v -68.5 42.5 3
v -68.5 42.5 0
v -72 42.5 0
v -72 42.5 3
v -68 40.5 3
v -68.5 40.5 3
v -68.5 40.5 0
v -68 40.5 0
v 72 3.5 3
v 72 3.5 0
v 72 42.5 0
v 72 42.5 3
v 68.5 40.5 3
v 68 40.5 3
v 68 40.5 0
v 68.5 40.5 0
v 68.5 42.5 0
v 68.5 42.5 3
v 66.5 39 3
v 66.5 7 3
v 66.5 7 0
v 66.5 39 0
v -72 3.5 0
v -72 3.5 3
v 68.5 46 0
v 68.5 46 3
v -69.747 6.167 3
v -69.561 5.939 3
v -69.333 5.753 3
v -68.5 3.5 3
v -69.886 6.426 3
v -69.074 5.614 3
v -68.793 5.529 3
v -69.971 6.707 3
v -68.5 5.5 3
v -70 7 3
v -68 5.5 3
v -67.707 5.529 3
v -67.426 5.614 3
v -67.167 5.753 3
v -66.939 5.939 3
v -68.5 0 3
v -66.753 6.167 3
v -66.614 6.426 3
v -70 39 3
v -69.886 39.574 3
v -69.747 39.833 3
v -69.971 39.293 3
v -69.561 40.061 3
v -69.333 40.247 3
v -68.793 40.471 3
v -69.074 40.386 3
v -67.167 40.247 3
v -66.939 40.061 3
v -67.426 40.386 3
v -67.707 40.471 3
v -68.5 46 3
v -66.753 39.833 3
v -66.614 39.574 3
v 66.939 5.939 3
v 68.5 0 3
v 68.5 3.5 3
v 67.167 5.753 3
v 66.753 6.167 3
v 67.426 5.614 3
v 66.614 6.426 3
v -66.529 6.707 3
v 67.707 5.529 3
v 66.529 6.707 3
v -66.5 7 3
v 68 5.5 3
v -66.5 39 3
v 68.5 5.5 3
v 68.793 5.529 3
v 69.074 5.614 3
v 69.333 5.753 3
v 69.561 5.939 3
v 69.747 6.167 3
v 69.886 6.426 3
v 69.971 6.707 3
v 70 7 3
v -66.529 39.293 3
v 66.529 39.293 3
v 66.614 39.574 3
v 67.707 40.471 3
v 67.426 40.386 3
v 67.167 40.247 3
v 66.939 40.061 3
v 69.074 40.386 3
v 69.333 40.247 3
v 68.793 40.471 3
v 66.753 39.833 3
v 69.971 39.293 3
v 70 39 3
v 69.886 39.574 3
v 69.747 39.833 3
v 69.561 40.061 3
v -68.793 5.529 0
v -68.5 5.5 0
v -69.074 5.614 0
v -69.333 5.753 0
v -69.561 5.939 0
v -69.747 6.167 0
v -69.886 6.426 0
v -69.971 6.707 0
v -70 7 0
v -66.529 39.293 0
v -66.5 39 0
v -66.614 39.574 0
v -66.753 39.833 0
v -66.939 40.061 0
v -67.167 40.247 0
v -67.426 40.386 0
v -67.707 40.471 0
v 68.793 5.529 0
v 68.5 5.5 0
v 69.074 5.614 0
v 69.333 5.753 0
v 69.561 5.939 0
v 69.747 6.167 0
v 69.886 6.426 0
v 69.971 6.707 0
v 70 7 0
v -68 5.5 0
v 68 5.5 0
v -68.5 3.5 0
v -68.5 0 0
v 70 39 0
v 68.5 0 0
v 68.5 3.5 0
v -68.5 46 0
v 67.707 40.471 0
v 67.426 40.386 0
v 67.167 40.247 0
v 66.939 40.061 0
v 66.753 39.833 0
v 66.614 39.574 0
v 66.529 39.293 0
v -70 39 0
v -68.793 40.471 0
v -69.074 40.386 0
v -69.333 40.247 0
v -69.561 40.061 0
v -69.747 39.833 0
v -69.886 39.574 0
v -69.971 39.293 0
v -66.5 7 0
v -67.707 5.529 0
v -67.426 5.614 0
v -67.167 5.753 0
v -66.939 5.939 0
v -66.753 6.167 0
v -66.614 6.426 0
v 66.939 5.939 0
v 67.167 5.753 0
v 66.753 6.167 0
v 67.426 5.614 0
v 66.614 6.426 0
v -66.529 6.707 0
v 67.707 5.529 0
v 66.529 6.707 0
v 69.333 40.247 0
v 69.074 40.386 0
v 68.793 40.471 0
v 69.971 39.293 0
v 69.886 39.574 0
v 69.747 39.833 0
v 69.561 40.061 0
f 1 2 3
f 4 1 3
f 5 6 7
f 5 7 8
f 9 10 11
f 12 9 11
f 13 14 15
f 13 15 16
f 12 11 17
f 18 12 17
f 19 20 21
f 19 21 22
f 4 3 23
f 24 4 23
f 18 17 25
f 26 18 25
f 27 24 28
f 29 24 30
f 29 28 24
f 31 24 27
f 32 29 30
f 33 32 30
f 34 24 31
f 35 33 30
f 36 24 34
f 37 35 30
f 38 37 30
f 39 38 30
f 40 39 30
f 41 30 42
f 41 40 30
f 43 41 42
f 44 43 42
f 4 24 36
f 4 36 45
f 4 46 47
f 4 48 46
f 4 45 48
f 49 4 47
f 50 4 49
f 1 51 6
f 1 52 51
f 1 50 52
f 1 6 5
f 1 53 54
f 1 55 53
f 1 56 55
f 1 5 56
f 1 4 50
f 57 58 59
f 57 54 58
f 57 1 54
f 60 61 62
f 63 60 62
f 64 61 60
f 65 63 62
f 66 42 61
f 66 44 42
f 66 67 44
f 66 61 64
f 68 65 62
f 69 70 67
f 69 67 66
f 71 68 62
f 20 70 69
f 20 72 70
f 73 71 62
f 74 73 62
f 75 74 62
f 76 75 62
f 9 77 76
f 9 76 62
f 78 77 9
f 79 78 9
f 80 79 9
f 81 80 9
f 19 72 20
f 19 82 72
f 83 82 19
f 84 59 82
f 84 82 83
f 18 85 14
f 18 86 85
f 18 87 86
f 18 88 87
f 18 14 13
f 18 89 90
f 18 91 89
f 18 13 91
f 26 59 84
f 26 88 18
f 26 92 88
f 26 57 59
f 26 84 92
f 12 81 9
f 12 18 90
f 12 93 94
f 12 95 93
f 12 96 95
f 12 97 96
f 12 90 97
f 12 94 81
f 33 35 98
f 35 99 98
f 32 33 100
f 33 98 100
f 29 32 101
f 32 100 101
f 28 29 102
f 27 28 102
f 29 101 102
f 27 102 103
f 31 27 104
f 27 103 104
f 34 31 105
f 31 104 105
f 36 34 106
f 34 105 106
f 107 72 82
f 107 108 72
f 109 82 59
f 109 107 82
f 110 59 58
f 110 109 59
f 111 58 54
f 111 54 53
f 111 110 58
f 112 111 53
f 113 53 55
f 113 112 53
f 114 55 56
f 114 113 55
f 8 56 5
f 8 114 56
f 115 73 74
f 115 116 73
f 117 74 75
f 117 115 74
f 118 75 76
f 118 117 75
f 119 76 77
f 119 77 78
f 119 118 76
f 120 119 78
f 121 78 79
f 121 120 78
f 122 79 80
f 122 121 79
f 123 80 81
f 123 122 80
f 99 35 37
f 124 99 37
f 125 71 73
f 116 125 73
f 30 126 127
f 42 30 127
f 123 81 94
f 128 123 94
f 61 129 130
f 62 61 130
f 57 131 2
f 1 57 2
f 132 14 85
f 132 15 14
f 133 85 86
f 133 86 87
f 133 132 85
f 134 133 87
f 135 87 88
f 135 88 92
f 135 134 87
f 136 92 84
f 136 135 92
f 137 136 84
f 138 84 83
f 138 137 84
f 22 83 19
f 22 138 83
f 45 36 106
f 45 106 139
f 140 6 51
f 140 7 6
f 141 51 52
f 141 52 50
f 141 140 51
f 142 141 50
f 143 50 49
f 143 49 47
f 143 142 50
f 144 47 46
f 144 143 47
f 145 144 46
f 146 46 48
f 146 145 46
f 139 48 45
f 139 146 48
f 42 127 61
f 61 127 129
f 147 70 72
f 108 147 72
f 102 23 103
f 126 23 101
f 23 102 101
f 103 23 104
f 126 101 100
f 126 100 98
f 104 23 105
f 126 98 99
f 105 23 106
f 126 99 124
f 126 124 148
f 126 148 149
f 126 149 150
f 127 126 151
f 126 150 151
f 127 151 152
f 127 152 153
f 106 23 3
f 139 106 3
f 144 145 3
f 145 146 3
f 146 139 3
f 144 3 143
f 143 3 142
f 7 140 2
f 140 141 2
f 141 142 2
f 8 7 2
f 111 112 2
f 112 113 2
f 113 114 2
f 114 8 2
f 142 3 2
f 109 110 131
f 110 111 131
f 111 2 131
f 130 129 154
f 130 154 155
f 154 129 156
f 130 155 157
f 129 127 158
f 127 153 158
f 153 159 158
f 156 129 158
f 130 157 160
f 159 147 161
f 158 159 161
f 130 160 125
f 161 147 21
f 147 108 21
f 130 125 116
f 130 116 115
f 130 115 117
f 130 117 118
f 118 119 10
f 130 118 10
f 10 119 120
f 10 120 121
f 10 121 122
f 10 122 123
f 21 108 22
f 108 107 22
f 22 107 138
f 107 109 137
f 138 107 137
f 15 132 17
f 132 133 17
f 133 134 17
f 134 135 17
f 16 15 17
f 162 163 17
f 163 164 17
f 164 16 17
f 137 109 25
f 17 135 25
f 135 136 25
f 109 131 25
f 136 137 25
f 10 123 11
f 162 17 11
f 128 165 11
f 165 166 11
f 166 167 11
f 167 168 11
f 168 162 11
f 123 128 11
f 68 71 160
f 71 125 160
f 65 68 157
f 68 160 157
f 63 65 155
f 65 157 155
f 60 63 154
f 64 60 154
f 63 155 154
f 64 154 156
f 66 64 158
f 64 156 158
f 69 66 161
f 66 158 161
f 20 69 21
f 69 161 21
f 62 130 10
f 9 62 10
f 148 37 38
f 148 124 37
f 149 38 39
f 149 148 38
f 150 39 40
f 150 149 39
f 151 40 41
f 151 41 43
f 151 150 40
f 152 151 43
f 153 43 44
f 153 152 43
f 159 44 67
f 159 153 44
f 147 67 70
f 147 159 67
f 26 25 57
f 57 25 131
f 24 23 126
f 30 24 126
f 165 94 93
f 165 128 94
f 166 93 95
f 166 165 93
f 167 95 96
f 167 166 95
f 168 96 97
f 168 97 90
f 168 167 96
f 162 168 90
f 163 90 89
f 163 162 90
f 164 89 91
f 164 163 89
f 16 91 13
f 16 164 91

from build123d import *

# Parameters (mm, degrees)
BOSS_EXTRUDE1_DEPTH = 3
SKETCH2_W           = 3.5
SKETCH2_H           = 35
CUT_EXTRUDE7_DEPTH  = 3
FILLET5_R           = 1.5


with BuildPart() as part:
    # Sketch1 → Boss-Extrude1 (new body)
    with BuildSketch(Plane.XY):
        Polygon((68.5, 46), (-68.5, 46), (-68.5, 42.5), (-72, 42.5), (-72, 3.5), (-68.5, 3.5), (-68.5, 0), (68.5, 0), (68.5, 3.5), (72, 3.5), (72, 42.5), (68.5, 42.5), align=None)
    extrude(amount=BOSS_EXTRUDE1_DEPTH)

    # Sketch2 → Cut-Extrude7 (cut)
    with BuildSketch(Plane.XY.offset(3)):
        with Locations((-68.25, 23)):
            Rectangle(SKETCH2_W, SKETCH2_H)
        with Locations((68.25, 23)):
            Rectangle(SKETCH2_W, SKETCH2_H)
    extrude(amount=-CUT_EXTRUDE7_DEPTH, mode=Mode.SUBTRACT)

    # Fillet5
    fillet5_edges = [part.edges().sort_by_distance(p)[0] for p in [
        (-70, 5.5, 1.5),
        (-70, 40.5, 1.5),
        (-66.5, 40.5, 1.5),
        (-66.5, 5.5, 1.5),
        (70, 40.5, 1.5),
        (70, 5.5, 1.5),
        (66.5, 5.5, 1.5),
        (66.5, 40.5, 1.5),
    ]]
    fillet(fillet5_edges, radius=FILLET5_R)


solid = part.part
